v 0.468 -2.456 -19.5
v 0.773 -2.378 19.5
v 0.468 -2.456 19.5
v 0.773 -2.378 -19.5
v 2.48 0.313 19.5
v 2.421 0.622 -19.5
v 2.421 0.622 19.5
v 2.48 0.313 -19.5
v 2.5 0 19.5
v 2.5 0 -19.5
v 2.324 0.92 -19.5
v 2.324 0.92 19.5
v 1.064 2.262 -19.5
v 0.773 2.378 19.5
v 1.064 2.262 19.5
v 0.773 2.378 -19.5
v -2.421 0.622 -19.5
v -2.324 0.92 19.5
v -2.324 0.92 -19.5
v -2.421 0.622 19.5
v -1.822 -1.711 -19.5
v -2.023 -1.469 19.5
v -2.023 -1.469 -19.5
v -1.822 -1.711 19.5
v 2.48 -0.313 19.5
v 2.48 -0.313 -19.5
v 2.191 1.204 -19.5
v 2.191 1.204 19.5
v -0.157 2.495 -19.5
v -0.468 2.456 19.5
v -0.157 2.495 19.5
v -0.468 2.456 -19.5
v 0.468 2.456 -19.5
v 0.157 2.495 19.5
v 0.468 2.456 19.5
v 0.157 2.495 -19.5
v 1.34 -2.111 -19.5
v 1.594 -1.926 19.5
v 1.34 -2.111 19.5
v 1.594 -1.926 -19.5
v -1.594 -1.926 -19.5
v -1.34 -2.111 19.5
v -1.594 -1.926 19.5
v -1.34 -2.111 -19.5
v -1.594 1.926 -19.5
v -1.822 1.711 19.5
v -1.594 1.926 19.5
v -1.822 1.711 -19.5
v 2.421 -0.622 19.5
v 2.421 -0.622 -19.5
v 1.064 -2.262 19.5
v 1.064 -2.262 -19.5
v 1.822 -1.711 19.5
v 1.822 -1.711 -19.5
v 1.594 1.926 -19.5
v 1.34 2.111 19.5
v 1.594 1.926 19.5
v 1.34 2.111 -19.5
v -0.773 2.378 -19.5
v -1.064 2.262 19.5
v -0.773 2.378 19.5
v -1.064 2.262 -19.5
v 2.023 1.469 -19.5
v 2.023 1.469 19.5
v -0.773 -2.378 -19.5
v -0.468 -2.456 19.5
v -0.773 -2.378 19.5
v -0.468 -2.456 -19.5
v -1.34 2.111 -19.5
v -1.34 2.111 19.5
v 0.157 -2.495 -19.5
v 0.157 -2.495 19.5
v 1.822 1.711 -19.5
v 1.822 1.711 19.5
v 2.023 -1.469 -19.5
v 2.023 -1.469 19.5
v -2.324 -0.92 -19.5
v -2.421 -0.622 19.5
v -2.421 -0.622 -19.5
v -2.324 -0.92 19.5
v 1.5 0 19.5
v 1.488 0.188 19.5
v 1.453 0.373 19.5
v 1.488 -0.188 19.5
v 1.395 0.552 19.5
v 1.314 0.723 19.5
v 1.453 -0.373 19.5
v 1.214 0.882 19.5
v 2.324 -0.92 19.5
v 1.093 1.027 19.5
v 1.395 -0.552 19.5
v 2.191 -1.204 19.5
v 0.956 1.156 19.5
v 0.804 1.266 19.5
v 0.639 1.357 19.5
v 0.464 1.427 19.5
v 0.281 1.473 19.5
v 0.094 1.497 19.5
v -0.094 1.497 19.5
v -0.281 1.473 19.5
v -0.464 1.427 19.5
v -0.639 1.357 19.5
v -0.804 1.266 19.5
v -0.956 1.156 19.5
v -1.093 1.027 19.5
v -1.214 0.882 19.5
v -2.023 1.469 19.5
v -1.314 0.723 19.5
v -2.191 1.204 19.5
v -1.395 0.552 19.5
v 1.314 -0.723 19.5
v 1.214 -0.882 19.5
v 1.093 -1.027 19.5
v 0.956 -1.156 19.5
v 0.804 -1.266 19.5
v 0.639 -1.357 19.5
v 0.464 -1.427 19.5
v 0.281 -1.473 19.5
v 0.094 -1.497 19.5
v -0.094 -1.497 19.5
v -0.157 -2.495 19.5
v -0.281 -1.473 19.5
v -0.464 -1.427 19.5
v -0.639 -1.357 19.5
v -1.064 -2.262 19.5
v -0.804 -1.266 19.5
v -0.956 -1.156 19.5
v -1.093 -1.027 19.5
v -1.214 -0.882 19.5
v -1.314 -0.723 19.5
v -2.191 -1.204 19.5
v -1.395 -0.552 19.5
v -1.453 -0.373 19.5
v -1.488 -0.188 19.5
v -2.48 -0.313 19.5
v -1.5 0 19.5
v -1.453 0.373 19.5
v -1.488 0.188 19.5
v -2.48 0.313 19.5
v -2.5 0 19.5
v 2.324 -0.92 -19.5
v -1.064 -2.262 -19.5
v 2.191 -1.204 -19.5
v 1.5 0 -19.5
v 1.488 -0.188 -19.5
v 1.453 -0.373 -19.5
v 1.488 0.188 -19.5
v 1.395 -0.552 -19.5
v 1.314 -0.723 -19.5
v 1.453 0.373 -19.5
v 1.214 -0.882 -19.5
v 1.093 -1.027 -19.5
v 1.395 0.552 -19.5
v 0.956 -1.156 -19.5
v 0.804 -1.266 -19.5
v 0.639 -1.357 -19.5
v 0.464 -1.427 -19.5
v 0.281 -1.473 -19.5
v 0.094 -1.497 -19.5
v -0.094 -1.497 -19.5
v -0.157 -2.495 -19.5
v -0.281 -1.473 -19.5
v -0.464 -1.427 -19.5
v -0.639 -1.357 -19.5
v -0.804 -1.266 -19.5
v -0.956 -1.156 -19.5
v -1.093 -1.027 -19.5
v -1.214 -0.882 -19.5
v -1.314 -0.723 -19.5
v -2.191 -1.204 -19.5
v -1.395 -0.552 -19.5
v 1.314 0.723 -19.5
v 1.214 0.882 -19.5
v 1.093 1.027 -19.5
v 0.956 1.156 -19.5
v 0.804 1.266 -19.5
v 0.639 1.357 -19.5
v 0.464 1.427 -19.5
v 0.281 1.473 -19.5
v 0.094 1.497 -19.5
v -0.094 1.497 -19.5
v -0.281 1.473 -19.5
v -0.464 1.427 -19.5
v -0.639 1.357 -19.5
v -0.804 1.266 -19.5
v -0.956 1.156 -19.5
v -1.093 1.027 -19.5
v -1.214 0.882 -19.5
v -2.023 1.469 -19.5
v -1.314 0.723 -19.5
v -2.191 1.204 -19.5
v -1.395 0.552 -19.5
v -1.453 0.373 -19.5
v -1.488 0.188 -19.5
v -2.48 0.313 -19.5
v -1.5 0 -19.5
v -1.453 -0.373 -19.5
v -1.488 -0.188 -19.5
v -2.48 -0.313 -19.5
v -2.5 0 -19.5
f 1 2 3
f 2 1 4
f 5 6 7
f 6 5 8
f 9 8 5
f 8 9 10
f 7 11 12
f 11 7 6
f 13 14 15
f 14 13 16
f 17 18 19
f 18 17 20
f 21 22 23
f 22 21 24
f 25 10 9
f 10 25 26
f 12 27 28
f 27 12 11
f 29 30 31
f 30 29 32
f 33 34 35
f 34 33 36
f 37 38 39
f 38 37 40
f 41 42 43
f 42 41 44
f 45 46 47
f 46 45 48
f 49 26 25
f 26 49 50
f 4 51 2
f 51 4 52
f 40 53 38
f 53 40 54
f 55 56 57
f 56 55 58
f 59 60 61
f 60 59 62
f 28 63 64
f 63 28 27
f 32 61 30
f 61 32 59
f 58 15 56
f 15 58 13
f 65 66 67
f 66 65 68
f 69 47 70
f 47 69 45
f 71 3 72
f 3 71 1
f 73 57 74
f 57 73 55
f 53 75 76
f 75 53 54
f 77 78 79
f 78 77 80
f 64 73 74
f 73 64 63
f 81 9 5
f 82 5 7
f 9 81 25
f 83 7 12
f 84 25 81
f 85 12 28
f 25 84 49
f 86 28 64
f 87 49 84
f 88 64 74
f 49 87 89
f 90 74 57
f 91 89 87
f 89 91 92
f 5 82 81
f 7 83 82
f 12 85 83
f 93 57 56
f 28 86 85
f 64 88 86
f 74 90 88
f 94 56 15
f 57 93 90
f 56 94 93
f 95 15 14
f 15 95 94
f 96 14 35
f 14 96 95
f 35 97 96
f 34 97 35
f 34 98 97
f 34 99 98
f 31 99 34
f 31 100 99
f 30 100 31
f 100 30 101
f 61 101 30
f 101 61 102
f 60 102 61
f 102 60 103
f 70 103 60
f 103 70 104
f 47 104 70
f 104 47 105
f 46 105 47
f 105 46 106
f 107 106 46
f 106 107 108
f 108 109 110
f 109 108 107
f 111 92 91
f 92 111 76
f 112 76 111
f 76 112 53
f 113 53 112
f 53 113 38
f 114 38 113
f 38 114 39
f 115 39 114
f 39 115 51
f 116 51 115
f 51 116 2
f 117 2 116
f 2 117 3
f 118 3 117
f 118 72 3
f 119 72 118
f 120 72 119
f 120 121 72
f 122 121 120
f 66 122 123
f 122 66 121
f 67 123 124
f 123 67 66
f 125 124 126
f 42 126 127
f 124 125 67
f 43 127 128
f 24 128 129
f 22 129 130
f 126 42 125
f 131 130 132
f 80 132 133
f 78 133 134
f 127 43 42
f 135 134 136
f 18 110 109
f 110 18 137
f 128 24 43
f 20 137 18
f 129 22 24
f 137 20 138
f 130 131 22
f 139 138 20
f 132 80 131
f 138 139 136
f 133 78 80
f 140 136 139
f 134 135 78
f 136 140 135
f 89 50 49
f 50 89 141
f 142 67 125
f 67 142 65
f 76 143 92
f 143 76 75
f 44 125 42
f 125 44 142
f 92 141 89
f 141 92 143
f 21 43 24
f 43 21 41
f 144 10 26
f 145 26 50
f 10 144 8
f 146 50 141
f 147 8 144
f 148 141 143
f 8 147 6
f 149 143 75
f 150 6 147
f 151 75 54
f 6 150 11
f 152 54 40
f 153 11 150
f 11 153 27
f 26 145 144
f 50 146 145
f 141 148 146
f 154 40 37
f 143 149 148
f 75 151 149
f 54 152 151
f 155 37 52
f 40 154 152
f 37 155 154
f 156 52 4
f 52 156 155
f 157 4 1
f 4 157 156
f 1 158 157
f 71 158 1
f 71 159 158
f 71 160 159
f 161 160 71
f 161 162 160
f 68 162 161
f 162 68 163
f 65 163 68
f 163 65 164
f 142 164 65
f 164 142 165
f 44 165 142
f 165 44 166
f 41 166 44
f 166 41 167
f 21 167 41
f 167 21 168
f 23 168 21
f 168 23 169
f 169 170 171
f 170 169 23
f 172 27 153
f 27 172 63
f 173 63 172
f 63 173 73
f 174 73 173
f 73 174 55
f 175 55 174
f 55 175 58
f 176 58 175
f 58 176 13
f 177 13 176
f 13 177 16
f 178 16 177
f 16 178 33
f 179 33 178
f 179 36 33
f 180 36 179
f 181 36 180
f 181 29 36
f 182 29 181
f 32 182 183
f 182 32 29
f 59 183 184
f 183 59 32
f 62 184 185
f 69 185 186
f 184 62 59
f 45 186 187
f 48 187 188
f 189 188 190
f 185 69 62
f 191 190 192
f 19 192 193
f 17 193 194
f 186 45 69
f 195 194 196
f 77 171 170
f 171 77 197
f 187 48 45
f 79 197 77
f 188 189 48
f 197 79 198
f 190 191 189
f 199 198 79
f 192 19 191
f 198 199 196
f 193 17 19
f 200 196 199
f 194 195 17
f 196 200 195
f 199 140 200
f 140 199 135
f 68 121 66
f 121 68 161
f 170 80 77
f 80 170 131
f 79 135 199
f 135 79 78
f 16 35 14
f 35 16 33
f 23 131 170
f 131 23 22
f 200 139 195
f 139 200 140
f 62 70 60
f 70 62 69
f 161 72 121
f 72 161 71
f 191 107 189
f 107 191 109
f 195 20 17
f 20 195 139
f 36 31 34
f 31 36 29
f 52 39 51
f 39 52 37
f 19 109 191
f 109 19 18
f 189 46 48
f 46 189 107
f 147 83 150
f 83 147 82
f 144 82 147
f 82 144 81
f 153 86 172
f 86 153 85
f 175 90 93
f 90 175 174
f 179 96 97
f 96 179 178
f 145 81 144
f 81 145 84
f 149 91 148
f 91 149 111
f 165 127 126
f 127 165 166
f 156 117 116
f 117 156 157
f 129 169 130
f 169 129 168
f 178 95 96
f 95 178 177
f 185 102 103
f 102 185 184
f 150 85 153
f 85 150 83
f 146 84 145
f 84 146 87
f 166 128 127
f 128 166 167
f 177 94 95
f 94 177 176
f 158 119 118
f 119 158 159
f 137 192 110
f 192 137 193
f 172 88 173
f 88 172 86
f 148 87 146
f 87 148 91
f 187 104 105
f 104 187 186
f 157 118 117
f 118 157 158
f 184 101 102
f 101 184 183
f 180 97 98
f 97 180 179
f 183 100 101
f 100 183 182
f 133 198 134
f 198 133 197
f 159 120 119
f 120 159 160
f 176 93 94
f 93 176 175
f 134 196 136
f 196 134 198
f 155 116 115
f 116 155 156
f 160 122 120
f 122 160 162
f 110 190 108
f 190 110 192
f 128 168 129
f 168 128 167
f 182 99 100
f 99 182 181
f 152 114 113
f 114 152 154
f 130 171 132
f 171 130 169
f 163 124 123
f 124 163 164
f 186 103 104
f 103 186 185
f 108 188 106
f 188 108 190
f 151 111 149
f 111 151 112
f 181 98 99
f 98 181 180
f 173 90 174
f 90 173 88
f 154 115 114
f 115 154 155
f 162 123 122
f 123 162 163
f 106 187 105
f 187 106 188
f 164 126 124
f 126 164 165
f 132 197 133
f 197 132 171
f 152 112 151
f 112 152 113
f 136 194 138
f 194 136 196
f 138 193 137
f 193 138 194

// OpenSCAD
$fn = 50;


difference() {
	union() {
		translate(v = [0, 0, -19.5000000000]) {
			cylinder(h = 39, r = 2.5000000000);
		}
	}
	union() {
		translate(v = [0, 0, -100.0000000000]) {
			cylinder(h = 200, r = 1.5000000000);
		}
	}
}
